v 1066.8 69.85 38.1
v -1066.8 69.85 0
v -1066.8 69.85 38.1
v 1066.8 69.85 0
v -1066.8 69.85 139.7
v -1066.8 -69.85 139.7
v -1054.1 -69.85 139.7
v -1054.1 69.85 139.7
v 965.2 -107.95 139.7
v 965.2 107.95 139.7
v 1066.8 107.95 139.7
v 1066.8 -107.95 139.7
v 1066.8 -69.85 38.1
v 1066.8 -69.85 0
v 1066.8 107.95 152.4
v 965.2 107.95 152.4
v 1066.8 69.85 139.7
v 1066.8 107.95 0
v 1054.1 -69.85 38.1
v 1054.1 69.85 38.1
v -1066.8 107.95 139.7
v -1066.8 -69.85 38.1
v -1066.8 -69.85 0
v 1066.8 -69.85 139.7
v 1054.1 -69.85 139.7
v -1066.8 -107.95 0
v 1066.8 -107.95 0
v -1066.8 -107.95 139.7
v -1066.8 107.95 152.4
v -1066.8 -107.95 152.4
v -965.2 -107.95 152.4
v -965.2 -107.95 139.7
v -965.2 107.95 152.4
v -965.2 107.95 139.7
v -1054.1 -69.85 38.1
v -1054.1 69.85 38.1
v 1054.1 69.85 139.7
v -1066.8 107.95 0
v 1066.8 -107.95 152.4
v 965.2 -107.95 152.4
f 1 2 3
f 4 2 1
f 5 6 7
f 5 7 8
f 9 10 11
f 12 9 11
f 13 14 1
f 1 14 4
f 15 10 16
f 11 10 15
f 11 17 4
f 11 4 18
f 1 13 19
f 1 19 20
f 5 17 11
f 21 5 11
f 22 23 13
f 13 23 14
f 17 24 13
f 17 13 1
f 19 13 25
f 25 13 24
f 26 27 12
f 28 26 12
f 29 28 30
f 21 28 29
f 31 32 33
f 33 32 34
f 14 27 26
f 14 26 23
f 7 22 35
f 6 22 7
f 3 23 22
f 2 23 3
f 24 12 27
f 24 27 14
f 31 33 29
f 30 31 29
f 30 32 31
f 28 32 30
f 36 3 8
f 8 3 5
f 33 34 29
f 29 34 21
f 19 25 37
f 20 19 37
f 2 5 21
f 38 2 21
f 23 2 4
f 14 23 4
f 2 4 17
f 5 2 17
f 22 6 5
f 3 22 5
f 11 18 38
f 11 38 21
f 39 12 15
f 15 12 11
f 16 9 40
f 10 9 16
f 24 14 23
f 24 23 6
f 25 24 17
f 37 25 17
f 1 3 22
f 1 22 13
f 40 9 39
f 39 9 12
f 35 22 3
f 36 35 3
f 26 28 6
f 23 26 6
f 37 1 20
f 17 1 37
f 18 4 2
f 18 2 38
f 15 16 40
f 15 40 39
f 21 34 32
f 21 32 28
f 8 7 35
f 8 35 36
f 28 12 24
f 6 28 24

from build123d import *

# Parameters (mm, degrees)
F0_W     = 2133.6
F0_H     = 139.7
F1_DEPTH = 38.1
F2_W     = 38.1
F2_H     = 139.7
F3_DEPTH = 2133.6
F4_W     = 139.7
F4_H     = 101.6
F5_DEPTH = 12.7
F6_W     = 101.6
F6_H     = 215.9
F7_DEPTH = 12.7


with BuildPart() as f1:
    # F0 (on Top) → F1 (new body)
    with BuildSketch(Plane.XY):
        Rectangle(F0_W, F0_H)
    extrude(amount=F1_DEPTH)


with BuildPart() as f3:
    # F2 (on face) → F3 (new body, through all)
    with BuildSketch(Plane.YZ.offset(1066.8)):
        with Locations((88.9, 69.85)):
            Rectangle(F2_W, F2_H)
        with Locations((-88.9, 69.85)):
            Rectangle(F2_W, F2_H)
    extrude(amount=-F3_DEPTH)


with BuildPart() as f5:
    # F4 (on face) → F5 (new body)
    with BuildSketch(Plane.YZ.offset(1066.8)):
        with Locations((0, 88.9)):
            Rectangle(F4_W, F4_H)
    extrude(amount=-F5_DEPTH)


with BuildPart() as f7:
    # F6 (on face) → F7 (new body)
    with BuildSketch(Plane.XY.offset(139.7)):
        with Locations((1016, 0)):
            Rectangle(F6_W, F6_H)
    extrude(amount=F7_DEPTH)


with BuildPart() as f8_1:
    # F8: instance of F7
    add(f7.part.mirror(Plane.YZ))


with BuildPart() as f8_2:
    # F8: instance of F5
    add(f5.part.mirror(Plane.YZ))


solid = Compound([f1.part, f3.part, f5.part, f7.part, f8_1.part, f8_2.part])
